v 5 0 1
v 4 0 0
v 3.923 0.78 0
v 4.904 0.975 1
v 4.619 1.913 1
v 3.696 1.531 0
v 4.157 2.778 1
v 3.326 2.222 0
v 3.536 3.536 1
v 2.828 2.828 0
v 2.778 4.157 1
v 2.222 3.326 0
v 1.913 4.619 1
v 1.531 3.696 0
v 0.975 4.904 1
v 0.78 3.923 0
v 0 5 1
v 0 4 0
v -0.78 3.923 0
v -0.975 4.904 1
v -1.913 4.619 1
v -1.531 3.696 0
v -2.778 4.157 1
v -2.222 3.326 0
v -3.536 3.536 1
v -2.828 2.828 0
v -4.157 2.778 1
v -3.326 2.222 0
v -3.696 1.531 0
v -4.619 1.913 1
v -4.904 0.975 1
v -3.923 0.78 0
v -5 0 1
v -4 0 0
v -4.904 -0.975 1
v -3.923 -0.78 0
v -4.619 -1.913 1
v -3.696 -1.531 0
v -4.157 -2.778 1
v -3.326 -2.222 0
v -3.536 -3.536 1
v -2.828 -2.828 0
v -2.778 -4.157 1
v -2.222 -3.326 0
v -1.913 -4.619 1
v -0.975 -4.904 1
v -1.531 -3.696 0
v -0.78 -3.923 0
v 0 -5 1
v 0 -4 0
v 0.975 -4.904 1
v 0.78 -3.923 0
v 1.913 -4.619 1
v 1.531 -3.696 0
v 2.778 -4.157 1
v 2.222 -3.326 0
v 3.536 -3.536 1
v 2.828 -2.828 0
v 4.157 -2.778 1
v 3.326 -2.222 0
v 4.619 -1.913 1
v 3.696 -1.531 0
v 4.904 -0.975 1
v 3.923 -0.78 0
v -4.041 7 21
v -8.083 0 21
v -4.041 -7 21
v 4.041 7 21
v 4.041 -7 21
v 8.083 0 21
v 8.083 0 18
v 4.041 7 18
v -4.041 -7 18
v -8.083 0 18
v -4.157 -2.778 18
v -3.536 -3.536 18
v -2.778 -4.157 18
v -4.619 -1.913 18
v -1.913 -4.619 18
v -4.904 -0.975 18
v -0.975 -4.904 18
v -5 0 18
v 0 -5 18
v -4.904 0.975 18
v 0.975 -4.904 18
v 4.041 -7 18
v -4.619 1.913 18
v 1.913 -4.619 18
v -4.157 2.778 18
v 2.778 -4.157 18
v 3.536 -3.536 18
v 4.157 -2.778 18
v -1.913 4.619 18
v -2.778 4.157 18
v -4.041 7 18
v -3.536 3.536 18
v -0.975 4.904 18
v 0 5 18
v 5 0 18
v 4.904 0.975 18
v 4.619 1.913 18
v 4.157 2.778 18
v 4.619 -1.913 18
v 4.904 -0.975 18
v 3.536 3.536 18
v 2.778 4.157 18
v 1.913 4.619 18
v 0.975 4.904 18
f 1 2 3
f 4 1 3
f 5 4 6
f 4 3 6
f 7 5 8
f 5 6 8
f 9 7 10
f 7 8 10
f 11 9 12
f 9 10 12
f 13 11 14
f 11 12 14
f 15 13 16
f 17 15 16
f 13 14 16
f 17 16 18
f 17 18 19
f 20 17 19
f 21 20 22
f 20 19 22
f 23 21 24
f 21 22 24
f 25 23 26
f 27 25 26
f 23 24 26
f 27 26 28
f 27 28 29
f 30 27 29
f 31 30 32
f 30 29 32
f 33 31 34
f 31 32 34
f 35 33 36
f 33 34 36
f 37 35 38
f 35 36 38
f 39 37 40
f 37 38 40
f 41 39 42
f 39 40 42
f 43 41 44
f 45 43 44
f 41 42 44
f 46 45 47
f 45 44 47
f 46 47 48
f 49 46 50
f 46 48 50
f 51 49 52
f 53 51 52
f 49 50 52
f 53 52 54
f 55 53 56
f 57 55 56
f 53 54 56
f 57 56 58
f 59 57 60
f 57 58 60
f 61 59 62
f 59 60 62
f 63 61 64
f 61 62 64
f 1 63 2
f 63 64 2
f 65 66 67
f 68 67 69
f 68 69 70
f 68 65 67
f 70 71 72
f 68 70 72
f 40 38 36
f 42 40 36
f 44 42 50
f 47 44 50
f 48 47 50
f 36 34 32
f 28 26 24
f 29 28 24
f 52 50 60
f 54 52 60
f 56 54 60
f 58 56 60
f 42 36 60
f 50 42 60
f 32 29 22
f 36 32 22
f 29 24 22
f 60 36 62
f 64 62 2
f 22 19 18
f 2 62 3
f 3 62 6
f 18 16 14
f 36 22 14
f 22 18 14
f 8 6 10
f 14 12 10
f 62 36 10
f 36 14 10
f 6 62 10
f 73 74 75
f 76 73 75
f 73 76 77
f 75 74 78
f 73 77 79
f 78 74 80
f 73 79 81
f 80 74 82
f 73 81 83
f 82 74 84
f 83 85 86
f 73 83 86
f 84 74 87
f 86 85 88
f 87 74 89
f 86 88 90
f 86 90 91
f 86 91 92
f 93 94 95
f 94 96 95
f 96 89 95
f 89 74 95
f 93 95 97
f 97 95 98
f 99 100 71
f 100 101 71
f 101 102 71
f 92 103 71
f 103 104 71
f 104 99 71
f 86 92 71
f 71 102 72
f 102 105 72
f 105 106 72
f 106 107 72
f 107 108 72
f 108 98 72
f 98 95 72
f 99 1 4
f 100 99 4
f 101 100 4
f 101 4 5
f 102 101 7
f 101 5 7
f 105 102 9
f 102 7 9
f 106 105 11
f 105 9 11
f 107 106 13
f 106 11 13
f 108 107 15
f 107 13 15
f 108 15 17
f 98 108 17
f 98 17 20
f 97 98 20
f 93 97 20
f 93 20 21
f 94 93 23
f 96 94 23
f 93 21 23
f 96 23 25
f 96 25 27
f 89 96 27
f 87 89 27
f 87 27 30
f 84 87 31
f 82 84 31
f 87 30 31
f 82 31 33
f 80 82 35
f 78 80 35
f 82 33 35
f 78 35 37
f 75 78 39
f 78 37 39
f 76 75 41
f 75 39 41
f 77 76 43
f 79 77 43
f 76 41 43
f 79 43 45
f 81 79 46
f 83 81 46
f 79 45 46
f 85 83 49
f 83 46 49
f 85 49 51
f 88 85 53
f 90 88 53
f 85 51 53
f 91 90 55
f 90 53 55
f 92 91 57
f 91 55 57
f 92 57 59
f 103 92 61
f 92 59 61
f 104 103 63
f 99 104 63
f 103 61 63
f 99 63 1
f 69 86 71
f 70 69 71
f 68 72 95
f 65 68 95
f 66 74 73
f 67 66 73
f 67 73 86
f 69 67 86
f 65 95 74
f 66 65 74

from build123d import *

# Parameters (mm, degrees)
F0_R     = 5
F1_DEPTH = 18
F2_SIZE2 = 1
F2_SIZE  = 1
F4_DEPTH = 3


with BuildPart() as f1:
    # F0 (on Top) → F1 (new body)
    with BuildSketch(Plane.XY):
        Circle(F0_R)
    extrude(amount=F1_DEPTH)

    # F2
    f2_edges = [f1.edges().sort_by_distance(p)[0] for p in [
        (-5, 0, 0),
    ]]
    chamfer(f2_edges, length=F2_SIZE, length2=F2_SIZE2)

    # F3 (on face) → F4 (join)
    with BuildSketch(Plane.XY.offset(18)):
        Polygon((8.082904, 0), (4.041452, 7), (-4.041452, 7), (-8.082904, 0), (-4.041452, -7), (4.041452, -7), align=None)
    extrude(amount=F4_DEPTH)


solid = f1.part
